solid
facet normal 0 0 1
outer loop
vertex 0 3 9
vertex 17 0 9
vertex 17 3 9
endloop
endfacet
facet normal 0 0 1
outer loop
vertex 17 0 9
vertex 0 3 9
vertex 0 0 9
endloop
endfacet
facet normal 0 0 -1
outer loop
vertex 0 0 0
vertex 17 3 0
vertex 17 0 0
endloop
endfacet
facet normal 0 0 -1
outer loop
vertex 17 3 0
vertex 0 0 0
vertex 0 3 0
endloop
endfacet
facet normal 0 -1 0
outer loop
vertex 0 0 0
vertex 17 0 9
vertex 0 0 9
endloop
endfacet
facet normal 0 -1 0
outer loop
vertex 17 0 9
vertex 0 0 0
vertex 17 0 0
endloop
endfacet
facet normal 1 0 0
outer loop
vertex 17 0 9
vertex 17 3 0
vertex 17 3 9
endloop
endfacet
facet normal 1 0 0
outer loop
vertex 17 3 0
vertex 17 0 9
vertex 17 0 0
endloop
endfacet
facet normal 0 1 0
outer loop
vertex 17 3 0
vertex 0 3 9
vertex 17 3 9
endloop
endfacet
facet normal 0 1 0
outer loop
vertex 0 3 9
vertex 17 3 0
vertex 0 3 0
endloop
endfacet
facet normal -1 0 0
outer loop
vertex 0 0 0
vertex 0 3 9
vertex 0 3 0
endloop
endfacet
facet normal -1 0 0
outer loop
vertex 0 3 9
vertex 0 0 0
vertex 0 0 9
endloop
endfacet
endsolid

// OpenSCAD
// Generated by SolidPython 1.0.1 on 2020-07-29 00:46:56


cube(size = [17, 3, 9]);
/***********************************************
*********      SolidPython code:      **********
************************************************
 
# import packages: SolidPython
from solid import *
from solid.utils import *
from itertools import chain, combinations, permutations


class Resize:

    def __init__(self, scad_file):
        self.scad_file = scad_file
        #self.scad_file = import_scad(scad_file)
        # cone/cylinder param:
        self.r1 = 0
        self.r2 = 0
        self.h = 0
        # rectangular prism param:
        self.w = 0
        self.l = 0
        # ellipse param:
        self.r = 0

    # import OpenScad code (file name corresponds to shape)


    # classify shape + parameters
    def assign(self, param1, param2, param3):
        if self.scad_file == 'cone.scad':
            self.r1 = param1
            self.r2 = param2
            self.h = param3
        elif self.scad_file == 'cylinder.scad':
            self.r1 = param1
            self.r2 = param2
            self.h = param3
        elif self.scad_file == 'rectangularPrism.scad':
            self.h = param1
            self.l = param2
            self.w = param3
        else:
            self.r = param1
            self.h = param2

    # resize parameters
    def iterate(self):
        x = range(3, 20, 2)
        i = 1
        if self.scad_file == 'cone.scad':
            tempList = list(permutations(x, 2))
            for temp in tempList:
                param1 = temp[0]
                param2 = temp[1]
                filepath = 'produced_scad_files/' + 'cone' + str(param1) + '_' + str(param2) + '_' + '.scad'
                scad_render_to_file(cylinder(h=param1, r1=param2, r2=0), filepath)

        elif self.scad_file == 'cylinder.scad':
            tempList = list(permutations(x, 3))
            for temp in tempList:
                param1 = temp[0]
                param2 = temp[1]
                filepath = 'produced_scad_files/' + 'cylinder' + str(param1) + '_' + str(param2) + '_' + '.scad'
                scad_render_to_file(cylinder(h=param1, r1=param2, r2=param2), filepath)

        elif self.scad_file == 'rectangularPrism.scad':
            tempList = list(permutations(x, 3))
            for temp in tempList:
                param1 = temp[0]
                param2 = temp[1]
                param3 = temp[2]
                filepath = 'produced_scad_files/' + 'rectangularPrism' + str(param1) + '_' + str(param2) + '_' + str(
                    param3) + '.scad'
                scad_render_to_file(cube(size=(param1, param2, param3)), filepath)

        elif self.scad_file == 'ellipse.scad':
            tempList = list(permutations(x, 4))
            for temp in tempList:
                param1 = temp[0]
                param2 = temp[1]
                param3 = temp[2]
                param4 = temp[3]
                filepath = 'produced_scad_files/' + 'ellipse' + str(param1) + '_' + str(param2) + '_' + str(param3) + '_' + str(param4) + '.scad'
                scad_render_to_file(scale([param1, param2, param3])(sphere(r=param4)), filepath)

    def render_to_scadfile(self):
        scad_render_to_file(scad, 'example.scad') 
 
************************************************/
